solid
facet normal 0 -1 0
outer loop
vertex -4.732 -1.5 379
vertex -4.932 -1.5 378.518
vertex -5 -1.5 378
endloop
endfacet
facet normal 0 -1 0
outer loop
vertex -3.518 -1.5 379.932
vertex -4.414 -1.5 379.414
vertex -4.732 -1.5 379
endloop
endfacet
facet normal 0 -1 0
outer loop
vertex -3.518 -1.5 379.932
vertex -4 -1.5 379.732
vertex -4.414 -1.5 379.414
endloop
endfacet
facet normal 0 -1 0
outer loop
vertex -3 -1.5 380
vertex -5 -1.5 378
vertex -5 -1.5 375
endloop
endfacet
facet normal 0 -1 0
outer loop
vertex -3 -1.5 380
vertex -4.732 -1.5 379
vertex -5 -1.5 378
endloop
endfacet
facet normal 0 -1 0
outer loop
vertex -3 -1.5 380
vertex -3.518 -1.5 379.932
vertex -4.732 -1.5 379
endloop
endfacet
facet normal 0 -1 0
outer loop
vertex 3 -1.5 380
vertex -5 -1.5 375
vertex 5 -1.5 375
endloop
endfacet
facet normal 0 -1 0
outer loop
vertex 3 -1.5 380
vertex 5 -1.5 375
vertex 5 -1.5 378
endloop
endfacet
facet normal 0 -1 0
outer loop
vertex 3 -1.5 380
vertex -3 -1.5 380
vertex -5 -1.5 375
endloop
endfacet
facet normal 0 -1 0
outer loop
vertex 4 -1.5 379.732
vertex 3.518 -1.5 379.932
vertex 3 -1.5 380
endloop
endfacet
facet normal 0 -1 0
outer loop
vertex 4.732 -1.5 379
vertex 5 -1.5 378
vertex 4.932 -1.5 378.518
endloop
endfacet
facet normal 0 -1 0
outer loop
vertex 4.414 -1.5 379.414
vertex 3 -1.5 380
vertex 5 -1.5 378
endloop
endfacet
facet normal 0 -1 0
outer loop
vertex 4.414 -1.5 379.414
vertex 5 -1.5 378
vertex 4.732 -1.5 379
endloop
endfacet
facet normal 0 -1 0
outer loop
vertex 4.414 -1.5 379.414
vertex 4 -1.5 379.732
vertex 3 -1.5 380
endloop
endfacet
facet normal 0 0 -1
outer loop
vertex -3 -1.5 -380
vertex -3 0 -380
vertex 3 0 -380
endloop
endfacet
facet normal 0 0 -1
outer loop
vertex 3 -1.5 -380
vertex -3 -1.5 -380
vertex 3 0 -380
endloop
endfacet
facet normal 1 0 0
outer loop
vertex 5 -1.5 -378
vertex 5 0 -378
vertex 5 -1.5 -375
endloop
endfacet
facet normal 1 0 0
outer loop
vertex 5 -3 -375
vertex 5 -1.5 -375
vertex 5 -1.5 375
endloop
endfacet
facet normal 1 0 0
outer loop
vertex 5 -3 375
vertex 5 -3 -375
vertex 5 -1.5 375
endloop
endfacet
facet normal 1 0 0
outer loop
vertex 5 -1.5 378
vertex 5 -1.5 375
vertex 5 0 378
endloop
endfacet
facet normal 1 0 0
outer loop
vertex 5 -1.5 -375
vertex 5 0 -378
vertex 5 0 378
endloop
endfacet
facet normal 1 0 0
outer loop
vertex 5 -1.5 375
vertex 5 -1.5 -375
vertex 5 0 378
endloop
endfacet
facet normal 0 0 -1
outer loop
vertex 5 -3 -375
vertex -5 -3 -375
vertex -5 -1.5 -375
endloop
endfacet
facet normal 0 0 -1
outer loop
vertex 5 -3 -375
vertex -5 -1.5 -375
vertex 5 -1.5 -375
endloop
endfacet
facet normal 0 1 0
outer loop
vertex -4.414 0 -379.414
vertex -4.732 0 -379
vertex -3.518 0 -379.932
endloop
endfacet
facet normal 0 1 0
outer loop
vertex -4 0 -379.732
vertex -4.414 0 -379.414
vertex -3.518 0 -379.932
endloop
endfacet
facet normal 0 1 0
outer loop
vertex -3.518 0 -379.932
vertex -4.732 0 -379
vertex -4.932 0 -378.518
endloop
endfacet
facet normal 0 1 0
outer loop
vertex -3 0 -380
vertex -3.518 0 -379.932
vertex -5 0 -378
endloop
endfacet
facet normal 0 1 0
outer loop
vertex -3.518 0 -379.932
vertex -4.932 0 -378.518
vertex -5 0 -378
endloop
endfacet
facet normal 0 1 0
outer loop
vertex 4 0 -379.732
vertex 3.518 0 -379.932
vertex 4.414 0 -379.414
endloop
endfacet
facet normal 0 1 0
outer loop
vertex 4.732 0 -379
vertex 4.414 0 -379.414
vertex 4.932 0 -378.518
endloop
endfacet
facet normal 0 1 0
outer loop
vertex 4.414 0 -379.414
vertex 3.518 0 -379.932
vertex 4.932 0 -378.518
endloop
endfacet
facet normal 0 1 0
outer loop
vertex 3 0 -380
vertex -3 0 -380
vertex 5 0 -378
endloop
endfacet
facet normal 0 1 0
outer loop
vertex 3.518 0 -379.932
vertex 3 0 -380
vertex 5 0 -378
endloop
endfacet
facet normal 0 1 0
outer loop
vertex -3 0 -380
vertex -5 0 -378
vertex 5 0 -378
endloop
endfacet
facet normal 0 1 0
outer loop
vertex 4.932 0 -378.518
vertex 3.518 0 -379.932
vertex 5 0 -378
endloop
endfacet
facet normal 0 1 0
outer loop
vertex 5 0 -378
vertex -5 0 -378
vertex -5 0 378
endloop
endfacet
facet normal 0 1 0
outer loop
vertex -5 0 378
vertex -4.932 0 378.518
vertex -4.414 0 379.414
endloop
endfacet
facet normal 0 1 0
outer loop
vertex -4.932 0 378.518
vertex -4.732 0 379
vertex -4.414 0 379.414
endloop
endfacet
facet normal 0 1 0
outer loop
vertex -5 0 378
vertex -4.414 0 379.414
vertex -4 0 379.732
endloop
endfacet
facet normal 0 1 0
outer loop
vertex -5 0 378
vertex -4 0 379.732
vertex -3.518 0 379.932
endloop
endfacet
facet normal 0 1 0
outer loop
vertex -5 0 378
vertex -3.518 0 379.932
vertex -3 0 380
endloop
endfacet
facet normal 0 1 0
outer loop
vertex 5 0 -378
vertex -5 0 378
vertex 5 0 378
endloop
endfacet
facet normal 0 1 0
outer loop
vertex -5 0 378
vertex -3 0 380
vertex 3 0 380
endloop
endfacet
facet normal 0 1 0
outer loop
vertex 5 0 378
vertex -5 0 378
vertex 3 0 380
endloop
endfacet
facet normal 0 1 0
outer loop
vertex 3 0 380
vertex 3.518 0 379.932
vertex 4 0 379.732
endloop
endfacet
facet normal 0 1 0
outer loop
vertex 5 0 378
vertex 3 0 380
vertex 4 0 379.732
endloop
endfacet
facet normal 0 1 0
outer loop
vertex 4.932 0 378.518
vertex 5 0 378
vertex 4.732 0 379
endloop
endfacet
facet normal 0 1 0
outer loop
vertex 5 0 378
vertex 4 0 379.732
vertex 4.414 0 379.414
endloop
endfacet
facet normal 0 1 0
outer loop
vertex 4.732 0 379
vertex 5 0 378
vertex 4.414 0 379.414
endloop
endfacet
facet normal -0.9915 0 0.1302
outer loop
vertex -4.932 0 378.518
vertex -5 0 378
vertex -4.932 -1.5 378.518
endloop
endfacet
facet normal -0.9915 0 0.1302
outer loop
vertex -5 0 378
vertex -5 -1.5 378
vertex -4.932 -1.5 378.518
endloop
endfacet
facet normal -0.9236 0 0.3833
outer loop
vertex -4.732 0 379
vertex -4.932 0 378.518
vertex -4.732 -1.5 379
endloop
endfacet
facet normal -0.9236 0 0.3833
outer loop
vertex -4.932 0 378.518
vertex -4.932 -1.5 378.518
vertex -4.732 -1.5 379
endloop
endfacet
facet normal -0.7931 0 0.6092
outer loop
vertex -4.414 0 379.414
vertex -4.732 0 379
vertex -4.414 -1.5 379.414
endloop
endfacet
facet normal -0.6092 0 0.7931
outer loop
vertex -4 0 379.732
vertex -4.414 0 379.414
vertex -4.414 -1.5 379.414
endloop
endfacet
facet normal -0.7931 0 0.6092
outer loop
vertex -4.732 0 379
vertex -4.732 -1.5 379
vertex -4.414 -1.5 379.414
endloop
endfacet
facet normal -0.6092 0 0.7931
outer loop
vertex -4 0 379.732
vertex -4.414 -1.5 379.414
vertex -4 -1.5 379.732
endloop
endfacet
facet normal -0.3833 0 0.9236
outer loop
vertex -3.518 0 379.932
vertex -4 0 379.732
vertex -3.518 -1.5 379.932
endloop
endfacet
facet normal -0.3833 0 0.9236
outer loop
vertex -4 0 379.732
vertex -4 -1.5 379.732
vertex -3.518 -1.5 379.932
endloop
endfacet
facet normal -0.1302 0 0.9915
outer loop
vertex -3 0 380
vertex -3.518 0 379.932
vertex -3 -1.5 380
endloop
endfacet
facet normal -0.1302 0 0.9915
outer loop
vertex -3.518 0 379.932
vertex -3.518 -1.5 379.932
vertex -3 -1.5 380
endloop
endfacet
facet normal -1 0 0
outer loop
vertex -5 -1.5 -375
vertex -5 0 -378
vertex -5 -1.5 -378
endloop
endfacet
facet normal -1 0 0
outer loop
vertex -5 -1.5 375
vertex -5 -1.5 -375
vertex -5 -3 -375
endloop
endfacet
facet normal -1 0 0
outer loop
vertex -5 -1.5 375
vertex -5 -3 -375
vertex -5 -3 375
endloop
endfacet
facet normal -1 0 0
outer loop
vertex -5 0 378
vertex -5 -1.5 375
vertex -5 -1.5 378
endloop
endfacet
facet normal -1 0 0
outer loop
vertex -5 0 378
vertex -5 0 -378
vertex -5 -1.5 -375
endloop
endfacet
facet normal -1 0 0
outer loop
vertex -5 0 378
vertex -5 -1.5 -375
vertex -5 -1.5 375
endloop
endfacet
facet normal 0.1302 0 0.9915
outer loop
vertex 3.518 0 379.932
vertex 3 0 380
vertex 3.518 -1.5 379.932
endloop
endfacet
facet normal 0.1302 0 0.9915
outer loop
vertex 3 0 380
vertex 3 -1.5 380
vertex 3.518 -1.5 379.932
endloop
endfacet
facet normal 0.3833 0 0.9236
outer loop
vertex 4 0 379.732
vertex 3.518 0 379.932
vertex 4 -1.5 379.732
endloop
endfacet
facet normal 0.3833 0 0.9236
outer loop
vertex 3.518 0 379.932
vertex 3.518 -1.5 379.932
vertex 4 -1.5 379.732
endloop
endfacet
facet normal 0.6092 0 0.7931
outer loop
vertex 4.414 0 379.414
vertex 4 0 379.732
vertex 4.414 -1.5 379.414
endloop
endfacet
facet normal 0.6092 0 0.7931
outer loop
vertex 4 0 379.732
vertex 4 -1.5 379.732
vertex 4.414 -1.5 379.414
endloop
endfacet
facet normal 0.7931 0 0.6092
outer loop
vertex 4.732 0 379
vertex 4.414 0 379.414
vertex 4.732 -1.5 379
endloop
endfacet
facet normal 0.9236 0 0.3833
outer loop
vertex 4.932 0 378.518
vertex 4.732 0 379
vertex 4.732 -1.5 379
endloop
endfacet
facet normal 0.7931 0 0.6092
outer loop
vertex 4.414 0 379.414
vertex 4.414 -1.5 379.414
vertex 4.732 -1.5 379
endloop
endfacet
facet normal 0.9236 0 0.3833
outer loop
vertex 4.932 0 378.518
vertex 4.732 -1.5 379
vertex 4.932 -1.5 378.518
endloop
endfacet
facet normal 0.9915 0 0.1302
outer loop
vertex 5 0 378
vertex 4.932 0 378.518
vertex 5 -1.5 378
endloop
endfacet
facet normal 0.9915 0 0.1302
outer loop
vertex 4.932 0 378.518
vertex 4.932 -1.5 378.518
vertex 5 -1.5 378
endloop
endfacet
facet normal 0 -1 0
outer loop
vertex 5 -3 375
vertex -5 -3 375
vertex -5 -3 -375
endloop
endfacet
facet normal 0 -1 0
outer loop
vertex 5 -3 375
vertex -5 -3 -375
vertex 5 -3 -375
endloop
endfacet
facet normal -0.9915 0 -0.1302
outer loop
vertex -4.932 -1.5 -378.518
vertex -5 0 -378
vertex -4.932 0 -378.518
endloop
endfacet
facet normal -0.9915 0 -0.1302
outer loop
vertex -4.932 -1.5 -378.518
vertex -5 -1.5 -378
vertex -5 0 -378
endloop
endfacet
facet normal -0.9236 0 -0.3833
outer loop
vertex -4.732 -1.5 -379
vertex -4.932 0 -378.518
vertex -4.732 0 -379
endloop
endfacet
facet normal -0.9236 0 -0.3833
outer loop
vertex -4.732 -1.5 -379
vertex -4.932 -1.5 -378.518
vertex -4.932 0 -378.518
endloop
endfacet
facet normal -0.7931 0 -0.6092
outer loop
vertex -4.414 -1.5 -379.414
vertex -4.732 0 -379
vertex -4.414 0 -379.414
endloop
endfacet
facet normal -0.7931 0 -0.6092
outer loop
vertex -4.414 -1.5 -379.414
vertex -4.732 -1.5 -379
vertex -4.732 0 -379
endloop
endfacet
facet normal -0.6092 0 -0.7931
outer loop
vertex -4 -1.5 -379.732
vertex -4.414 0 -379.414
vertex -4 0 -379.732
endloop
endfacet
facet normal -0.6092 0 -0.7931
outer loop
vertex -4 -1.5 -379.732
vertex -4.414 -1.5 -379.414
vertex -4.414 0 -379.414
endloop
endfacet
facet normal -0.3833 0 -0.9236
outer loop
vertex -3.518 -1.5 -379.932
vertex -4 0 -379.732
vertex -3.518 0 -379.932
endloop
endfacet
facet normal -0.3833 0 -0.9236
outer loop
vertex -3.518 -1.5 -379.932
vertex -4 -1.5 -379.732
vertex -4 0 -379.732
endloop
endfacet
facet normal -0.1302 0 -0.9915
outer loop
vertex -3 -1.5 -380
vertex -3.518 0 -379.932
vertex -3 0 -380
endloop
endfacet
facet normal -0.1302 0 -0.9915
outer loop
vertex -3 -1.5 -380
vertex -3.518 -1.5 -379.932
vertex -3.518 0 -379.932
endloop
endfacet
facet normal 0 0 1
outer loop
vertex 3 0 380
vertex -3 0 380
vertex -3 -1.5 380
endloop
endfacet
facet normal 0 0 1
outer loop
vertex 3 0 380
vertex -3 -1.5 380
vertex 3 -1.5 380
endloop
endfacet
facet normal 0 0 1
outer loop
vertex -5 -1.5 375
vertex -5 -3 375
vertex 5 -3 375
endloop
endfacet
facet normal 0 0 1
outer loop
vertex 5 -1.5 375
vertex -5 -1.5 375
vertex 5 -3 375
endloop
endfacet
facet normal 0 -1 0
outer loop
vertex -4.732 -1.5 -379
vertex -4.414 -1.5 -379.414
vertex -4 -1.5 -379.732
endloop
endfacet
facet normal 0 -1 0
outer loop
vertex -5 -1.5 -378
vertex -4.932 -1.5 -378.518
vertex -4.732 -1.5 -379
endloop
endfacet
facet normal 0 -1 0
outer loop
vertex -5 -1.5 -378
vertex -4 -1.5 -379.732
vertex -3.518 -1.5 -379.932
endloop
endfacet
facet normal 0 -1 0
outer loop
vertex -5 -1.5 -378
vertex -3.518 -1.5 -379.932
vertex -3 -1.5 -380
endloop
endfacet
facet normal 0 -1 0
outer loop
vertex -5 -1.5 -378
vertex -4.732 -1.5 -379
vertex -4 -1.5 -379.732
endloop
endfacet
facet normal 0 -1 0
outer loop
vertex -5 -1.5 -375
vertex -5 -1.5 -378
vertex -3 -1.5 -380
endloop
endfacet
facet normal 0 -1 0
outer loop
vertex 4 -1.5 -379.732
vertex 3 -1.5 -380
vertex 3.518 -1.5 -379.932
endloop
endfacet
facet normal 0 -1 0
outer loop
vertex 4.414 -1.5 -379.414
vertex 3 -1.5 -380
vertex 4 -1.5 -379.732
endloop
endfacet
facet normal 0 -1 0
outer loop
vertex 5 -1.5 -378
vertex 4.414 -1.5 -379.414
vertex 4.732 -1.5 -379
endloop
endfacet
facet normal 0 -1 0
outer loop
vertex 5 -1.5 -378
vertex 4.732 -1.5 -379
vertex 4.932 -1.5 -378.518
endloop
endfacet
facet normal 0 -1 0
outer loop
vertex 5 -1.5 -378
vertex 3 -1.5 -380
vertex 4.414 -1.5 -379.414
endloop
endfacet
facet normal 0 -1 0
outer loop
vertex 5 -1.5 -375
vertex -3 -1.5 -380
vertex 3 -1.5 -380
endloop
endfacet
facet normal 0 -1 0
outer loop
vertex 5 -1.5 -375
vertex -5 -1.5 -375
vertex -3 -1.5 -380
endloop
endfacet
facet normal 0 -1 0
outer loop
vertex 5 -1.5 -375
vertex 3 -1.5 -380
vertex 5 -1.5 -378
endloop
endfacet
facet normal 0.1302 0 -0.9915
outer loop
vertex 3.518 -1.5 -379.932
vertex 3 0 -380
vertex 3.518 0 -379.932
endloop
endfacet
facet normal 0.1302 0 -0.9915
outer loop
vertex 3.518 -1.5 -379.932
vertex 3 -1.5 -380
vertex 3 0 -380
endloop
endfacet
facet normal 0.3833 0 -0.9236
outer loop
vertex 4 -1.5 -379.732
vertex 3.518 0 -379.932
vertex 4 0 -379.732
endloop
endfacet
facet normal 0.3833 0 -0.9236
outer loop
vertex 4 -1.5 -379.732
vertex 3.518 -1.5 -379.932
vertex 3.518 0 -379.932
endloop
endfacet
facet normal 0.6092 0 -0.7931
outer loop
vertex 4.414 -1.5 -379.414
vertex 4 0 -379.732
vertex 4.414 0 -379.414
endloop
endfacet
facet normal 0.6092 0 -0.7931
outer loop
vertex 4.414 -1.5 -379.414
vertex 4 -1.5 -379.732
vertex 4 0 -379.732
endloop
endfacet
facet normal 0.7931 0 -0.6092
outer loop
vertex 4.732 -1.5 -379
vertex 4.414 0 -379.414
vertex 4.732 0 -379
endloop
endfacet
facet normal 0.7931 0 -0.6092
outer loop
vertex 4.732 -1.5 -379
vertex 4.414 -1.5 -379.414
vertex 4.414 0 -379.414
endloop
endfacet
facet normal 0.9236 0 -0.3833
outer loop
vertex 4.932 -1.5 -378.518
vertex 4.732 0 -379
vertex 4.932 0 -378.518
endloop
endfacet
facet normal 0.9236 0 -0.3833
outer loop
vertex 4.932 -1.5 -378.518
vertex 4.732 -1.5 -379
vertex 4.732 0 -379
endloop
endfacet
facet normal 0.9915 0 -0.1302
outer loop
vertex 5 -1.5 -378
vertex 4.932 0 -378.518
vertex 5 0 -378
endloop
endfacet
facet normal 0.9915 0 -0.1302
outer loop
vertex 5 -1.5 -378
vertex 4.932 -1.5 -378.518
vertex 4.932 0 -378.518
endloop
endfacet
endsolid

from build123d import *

# Parameters (mm, degrees)
F0_W     = 10
F0_H     = 760
F1_DEPTH = 3
F2_W     = 10
F2_H     = 5
F3_DEPTH = 1.5
F4_R     = 2


with BuildPart() as f1:
    # F0 (on Front) → F1 (new body)
    with BuildSketch(Plane.XZ):
        Rectangle(F0_W, F0_H)
    extrude(amount=F1_DEPTH)

    # F2 (on face) → F3 (cut)
    with BuildSketch(Plane.XZ.offset(3)):
        with Locations((0, 377.5)):
            Rectangle(F2_W, F2_H)
        with Locations((0, -377.5)):
            Rectangle(F2_W, F2_H)
    extrude(amount=-F3_DEPTH, mode=Mode.SUBTRACT)

    # F4
    f4_edges = [f1.edges().sort_by_distance(p)[0] for p in [
        (5, -0.75, -380),
        (-5, -0.75, -380),
        (-5, -0.75, 380),
        (5, -0.75, 380),
    ]]
    fillet(f4_edges, radius=F4_R)


solid = f1.part
